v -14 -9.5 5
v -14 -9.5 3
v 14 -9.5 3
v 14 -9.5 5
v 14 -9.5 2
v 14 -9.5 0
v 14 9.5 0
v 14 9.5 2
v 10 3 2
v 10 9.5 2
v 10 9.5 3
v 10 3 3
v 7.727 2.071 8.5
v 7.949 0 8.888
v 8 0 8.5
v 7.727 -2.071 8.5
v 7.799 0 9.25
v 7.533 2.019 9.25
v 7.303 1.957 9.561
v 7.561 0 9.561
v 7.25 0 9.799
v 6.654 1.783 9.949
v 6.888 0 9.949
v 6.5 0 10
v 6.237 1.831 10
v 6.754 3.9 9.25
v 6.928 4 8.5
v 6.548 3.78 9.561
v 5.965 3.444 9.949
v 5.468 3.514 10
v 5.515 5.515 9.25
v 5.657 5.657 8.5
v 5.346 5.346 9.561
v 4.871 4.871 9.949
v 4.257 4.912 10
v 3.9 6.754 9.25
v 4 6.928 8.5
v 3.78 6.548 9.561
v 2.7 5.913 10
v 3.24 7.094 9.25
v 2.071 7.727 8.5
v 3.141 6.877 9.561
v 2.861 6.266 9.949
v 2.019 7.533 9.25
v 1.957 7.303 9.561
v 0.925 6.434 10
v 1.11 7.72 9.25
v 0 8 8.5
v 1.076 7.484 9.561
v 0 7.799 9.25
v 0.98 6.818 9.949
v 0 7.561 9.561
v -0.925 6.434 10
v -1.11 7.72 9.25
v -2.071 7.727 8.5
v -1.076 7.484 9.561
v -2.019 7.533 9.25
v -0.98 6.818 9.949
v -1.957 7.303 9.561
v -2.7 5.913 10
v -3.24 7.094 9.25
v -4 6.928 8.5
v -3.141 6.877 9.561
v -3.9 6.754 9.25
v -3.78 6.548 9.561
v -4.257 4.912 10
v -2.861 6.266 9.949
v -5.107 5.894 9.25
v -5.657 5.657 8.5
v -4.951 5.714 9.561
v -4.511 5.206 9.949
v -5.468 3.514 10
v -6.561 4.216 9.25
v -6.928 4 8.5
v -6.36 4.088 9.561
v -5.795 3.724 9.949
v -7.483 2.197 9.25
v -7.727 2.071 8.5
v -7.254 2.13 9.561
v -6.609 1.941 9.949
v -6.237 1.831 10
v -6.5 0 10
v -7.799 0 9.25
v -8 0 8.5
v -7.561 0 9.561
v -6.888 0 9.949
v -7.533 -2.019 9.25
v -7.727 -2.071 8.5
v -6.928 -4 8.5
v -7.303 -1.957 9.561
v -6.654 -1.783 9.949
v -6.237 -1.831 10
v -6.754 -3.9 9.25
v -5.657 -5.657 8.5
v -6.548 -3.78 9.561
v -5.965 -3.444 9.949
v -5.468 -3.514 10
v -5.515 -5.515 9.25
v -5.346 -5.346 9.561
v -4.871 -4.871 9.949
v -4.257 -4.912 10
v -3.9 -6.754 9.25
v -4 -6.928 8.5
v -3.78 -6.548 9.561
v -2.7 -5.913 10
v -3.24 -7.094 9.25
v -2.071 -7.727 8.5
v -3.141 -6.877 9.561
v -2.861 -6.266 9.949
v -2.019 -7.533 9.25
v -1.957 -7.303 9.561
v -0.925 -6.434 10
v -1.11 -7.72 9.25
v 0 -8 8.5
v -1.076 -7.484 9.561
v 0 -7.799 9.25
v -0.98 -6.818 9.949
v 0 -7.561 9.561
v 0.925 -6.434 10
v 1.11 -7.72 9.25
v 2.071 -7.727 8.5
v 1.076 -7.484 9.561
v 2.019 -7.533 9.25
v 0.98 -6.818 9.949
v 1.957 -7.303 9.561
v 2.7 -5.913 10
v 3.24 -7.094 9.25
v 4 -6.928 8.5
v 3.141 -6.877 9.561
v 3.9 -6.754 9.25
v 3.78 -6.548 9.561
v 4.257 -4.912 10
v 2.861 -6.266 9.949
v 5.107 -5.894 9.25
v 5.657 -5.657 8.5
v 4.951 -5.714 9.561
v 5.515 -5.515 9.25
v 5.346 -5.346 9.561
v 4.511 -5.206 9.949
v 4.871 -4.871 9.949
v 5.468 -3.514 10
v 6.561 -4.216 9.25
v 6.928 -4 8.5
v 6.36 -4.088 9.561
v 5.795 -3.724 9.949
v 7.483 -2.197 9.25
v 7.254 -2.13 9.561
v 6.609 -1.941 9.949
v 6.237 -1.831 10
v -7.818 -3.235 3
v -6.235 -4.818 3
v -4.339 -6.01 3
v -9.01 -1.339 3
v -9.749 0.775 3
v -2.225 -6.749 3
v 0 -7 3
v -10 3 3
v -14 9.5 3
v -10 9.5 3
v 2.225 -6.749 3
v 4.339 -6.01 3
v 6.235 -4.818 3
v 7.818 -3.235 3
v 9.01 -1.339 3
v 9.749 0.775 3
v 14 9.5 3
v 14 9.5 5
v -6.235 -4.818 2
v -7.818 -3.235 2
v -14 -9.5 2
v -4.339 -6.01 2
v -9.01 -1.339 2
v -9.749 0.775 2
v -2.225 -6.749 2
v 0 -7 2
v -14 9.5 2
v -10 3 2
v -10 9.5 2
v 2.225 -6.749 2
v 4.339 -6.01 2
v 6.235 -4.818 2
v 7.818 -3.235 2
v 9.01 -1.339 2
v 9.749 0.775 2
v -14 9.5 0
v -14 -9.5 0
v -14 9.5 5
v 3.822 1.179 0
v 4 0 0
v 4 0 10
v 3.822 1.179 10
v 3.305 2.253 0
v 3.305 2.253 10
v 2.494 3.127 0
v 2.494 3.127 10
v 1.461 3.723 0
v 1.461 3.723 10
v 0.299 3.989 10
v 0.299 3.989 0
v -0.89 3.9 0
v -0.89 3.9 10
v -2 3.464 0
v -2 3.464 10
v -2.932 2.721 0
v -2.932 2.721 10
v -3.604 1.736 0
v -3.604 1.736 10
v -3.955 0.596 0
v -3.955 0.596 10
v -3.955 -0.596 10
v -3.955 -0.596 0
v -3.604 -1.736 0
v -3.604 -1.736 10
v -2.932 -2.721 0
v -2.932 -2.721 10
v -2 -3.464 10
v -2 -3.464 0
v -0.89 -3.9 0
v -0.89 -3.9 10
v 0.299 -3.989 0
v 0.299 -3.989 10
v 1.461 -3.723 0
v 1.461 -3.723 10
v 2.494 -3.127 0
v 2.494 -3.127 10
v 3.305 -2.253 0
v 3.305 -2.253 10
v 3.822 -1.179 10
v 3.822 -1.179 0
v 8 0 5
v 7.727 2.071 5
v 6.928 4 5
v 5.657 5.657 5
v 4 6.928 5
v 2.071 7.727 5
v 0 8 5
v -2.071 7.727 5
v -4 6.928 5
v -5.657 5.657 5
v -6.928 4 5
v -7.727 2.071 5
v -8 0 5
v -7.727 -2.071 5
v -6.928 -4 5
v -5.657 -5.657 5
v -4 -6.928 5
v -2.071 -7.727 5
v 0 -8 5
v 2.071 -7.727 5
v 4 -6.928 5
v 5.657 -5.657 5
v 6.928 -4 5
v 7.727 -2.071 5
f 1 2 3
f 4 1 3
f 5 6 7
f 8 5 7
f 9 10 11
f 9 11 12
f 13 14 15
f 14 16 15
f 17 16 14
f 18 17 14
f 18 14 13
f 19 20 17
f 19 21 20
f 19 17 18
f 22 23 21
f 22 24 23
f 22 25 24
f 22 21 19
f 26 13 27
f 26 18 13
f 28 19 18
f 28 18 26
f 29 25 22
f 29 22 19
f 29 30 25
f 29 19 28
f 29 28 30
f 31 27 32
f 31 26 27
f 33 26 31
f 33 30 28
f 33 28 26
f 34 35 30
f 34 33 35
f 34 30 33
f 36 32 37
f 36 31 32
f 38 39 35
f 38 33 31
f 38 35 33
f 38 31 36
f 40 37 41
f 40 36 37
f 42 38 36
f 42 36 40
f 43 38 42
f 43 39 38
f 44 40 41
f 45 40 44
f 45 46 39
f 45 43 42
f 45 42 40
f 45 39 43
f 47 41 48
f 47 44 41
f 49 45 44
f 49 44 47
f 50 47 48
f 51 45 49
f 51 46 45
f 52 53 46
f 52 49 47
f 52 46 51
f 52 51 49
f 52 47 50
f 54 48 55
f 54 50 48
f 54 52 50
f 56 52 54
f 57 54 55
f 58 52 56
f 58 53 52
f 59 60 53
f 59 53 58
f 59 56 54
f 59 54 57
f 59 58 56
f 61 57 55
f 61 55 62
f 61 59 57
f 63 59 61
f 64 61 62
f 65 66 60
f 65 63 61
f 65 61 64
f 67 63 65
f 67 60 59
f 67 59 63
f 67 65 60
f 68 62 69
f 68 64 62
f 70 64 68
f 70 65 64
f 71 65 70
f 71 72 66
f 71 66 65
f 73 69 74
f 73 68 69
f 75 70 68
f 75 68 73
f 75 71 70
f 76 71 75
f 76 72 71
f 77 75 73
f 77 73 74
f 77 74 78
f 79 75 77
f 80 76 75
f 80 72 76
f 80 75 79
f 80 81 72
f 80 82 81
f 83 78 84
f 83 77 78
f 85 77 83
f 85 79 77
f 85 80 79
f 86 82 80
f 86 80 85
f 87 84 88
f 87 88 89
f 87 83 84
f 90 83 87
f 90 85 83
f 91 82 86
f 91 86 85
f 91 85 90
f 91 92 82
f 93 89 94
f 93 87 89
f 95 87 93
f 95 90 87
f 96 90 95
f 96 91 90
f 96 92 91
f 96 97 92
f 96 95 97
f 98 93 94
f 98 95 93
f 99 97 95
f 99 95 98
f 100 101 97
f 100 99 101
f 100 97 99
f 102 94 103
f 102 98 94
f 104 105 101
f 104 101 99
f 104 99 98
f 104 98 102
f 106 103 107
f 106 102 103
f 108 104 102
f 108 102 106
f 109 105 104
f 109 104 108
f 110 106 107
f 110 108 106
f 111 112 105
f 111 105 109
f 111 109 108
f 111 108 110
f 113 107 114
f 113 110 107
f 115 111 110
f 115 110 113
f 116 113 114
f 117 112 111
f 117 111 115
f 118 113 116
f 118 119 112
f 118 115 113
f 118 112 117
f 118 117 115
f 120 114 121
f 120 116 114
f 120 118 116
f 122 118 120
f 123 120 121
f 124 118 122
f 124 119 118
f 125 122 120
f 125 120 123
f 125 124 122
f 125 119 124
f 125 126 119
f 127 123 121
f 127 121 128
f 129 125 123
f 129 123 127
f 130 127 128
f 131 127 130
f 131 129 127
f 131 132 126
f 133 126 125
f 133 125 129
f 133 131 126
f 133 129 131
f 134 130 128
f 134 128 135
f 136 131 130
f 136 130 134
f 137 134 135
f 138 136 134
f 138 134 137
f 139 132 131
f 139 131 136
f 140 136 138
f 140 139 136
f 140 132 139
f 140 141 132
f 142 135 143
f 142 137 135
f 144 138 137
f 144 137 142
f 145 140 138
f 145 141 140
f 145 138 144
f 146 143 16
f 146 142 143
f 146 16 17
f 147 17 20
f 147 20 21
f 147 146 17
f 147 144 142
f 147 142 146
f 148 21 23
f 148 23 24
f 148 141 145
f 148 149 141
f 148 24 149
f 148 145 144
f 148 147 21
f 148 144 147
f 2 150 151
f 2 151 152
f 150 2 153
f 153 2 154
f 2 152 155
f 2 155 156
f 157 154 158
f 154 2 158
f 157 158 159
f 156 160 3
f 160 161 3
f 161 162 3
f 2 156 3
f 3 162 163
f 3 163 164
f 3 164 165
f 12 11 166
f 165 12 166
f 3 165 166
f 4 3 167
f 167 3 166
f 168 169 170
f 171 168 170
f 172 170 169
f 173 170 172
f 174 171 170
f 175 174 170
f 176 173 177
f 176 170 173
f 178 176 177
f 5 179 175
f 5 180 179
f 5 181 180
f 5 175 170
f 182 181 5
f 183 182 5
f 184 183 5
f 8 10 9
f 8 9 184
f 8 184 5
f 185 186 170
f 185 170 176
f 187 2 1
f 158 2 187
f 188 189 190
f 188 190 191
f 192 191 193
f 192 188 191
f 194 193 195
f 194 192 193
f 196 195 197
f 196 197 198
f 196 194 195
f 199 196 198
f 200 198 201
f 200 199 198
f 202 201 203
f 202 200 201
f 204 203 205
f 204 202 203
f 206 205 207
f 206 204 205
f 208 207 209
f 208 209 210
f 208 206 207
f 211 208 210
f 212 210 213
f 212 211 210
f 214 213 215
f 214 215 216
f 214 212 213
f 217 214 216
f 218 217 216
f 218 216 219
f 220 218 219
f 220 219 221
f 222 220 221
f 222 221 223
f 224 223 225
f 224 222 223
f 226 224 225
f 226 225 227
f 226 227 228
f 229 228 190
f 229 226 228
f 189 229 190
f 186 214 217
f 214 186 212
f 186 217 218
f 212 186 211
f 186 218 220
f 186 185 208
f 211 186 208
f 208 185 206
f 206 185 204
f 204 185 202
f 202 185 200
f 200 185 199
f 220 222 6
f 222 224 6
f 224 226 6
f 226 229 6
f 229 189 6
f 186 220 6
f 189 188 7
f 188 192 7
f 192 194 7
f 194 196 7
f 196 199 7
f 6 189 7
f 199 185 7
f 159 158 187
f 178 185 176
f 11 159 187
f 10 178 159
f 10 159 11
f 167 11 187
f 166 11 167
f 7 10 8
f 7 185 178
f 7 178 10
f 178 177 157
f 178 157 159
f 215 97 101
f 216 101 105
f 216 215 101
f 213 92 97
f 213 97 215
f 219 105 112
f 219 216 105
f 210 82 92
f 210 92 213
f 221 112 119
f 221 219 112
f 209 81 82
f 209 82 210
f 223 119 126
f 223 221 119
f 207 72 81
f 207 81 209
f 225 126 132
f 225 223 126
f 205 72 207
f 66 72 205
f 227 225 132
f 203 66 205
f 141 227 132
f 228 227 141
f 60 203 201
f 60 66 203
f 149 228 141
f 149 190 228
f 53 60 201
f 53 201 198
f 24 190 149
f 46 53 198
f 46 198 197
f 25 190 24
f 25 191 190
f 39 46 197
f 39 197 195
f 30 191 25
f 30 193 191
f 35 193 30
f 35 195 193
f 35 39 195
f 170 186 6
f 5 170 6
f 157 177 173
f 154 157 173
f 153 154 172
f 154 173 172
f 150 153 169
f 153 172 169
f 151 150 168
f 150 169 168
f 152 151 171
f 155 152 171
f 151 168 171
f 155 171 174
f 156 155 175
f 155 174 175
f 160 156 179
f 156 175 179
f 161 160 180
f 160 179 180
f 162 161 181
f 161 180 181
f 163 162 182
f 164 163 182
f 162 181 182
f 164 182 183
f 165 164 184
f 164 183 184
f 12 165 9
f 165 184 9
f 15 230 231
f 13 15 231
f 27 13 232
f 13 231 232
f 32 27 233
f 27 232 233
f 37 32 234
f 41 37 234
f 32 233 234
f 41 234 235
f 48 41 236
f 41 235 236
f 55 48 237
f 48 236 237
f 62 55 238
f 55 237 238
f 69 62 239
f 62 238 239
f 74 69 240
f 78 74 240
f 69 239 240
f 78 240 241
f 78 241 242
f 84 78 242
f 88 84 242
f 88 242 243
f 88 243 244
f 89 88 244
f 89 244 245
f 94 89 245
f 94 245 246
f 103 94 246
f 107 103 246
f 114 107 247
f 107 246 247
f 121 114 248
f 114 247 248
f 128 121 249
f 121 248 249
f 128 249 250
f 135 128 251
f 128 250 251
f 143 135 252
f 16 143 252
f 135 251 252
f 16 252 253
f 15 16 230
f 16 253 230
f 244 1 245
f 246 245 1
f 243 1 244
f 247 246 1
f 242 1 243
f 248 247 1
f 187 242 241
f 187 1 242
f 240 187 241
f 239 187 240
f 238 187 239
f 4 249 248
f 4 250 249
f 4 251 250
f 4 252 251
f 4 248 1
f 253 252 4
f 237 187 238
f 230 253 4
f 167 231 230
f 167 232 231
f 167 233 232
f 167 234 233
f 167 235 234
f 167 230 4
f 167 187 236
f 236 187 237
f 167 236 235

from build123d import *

# Parameters (mm, degrees)
SKETCH004_R  = 4
PAD004_DEPTH = 10
SKETCH001_W  = 28
SKETCH001_H  = 19
PAD001_DEPTH = 2
PAD002_DEPTH = 1
SKETCH003_R  = 8
PAD003_DEPTH = 5
SKETCH_W     = 28
SKETCH_H     = 19
PAD_DEPTH    = 2
FILLET_R     = 1.5


with BuildPart() as body004:
    # Sketch004 → Pad004 (new body)
    with BuildSketch(Plane.XY):
        Circle(SKETCH004_R)
    extrude(amount=PAD004_DEPTH)


with BuildPart() as body001:
    # Sketch001 → Pad001 (new body)
    with BuildSketch(Plane.XY):
        Rectangle(SKETCH001_W, SKETCH001_H)
    extrude(amount=PAD001_DEPTH)


with BuildPart() as body001_1:
    # Body001 placement: moved
    add(body001.part.moved(Location((0, 0, 3))))


with BuildPart() as body002:
    # Sketch002 → Pad002 (new body)
    with BuildSketch(Plane.XY):
        with BuildLine():
            ThreePointArc((-10, 3), (0, -7), (10, 3))
            Line((10, 9.5), (10, 3))
            Line((-10, 9.5), (10, 9.5))
            Line((-10, 3), (-10, 9.5))
        make_face()
    extrude(amount=PAD002_DEPTH)


with BuildPart() as body002_1:
    # Body002 placement: moved
    add(body002.part.moved(Location((0, 0, 2))))


with BuildPart() as body003:
    # Sketch003 → Pad003 (new body)
    with BuildSketch(Plane.XY):
        Circle(SKETCH003_R)
    extrude(amount=PAD003_DEPTH)


with BuildPart() as body003_1:
    # Body003 placement: moved
    add(body003.part.moved(Location((0, 0, 5))))


with BuildPart() as fillet_body:
    # Sketch → Pad (new body)
    with BuildSketch(Plane.XY):
        Rectangle(SKETCH_W, SKETCH_H)
    extrude(amount=PAD_DEPTH)

    # Fusion: union Body001, Body002, Body003
    add(body001_1.part)
    add(body002_1.part)
    add(body003_1.part)

    # Cut: cut Body004
    add(body004.part, mode=Mode.SUBTRACT)

    # Fillet
    fillet_edges = [fillet_body.edges().sort_by_distance(p)[0] for p in [
        (-8, 0, 10),
    ]]
    fillet(fillet_edges, radius=FILLET_R)


solid = fillet_body.part
